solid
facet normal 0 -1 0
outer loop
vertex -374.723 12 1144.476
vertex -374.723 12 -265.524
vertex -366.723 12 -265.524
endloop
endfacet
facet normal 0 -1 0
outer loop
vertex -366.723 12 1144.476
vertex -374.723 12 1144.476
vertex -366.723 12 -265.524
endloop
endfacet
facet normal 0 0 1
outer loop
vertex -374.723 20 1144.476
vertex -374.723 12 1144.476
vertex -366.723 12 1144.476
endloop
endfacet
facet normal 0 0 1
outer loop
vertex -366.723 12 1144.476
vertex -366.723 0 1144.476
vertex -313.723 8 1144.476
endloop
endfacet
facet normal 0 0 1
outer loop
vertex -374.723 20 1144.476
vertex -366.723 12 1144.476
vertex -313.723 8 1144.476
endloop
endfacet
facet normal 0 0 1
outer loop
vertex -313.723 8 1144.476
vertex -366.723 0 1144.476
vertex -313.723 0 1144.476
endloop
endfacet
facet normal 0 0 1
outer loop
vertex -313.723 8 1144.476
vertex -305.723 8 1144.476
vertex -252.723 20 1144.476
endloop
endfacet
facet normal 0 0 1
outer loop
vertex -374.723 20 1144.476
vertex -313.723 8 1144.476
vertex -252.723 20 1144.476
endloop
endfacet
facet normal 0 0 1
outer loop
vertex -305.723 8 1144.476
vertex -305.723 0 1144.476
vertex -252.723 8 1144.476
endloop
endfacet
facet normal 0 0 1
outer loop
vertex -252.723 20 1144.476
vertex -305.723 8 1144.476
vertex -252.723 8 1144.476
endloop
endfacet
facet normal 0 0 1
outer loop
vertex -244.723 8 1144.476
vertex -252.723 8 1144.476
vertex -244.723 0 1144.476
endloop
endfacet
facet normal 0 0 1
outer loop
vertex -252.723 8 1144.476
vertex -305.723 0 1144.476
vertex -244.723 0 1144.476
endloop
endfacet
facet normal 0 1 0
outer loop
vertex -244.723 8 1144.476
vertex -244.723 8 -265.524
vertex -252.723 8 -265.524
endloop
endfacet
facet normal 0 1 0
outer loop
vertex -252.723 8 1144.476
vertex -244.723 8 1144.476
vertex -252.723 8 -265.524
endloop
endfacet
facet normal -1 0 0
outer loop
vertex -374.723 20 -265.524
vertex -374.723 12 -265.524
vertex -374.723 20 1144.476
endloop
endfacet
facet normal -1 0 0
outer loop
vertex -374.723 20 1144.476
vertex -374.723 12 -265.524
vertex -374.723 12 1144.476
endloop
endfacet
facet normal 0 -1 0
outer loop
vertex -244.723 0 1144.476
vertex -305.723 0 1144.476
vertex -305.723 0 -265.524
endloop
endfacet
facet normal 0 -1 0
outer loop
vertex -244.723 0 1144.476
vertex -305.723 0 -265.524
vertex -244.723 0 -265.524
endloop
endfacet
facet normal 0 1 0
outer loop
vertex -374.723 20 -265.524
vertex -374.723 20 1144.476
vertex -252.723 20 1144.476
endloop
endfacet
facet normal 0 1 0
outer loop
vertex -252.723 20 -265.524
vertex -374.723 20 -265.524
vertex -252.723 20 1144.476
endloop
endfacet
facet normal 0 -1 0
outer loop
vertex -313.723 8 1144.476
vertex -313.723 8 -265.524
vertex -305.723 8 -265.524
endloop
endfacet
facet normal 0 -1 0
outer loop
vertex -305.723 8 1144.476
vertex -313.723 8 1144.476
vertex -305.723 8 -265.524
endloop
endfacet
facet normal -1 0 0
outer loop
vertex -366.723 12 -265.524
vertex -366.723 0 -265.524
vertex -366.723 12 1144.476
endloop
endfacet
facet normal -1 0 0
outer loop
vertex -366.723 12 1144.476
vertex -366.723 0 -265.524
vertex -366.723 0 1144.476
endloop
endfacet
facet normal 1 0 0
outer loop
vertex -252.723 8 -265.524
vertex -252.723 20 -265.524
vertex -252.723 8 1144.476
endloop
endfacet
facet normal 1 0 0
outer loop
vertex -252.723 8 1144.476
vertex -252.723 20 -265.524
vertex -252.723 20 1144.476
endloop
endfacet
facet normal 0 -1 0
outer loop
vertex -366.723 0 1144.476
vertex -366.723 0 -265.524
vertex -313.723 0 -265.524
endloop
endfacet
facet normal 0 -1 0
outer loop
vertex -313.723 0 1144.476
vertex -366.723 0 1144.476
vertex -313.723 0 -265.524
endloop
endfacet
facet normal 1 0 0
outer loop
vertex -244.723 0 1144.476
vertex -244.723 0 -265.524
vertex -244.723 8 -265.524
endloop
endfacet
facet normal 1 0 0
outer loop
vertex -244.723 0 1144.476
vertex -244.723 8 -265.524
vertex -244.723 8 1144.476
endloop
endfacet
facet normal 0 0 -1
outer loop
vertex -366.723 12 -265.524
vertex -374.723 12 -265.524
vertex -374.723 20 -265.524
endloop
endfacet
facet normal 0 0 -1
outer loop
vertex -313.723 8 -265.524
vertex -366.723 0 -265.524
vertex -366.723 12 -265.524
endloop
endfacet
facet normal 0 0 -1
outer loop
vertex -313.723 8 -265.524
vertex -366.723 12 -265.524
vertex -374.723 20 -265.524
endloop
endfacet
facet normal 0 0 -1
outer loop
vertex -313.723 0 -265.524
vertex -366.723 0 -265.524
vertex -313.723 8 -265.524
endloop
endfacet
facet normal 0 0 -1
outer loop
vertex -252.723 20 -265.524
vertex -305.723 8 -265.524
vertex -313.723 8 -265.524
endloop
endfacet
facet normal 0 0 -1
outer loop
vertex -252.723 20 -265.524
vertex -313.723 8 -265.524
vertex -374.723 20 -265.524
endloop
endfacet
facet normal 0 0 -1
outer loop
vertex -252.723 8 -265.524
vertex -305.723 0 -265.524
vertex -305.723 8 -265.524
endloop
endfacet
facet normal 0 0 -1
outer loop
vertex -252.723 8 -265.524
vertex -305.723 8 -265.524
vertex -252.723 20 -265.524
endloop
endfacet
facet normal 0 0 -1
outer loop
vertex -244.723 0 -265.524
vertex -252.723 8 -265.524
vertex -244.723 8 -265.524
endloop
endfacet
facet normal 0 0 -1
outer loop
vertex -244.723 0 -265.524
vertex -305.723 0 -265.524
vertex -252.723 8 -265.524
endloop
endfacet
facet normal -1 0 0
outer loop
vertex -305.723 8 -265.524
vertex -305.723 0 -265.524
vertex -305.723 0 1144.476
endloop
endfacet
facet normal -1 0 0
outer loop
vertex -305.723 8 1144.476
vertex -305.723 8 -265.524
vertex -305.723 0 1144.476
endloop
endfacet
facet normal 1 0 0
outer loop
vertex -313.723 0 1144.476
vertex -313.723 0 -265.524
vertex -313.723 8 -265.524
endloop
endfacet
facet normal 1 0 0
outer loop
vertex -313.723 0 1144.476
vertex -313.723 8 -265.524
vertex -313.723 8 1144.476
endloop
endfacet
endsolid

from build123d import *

# Parameters (mm, degrees)
F0_W     = 130
F0_H     = 1410
F1_DEPTH = 20
F2_W     = 8
F2_H     = 1410
F3_DEPTH = 8
F4_W     = 8
F4_H     = 1460
F5_DEPTH = 12
F6_W     = 8
F6_H     = 1410
F7_DEPTH = 12


with BuildPart() as f1:
    # F0 (on Front) → F1 (new body)
    with BuildSketch(Plane.XZ):
        with Locations((-309.722924, 439.476302)):
            Rectangle(F0_W, F0_H)
    extrude(amount=-F1_DEPTH)

    # F2 (on face) → F3 (cut)
    with BuildSketch(Plane.XZ):
        with Locations((-309.722924, 439.476302)):
            Rectangle(F2_W, F2_H)
    extrude(amount=-F3_DEPTH, mode=Mode.SUBTRACT)

    # F4 (on face) → F5 (cut)
    with BuildSketch(Plane.XZ):
        with Locations((-370.722924, 414.476302)):
            Rectangle(F4_W, F4_H)
    extrude(amount=-F5_DEPTH, mode=Mode.SUBTRACT)

    # F6 (on face) → F7 (cut)
    with BuildSketch(Plane(origin=(0, 20, 0), x_dir=(-1, 0, 0), z_dir=(0, 1, 0))):
        with Locations((248.722924, 439.476302)):
            Rectangle(F6_W, F6_H)
    extrude(amount=-F7_DEPTH, mode=Mode.SUBTRACT)


solid = f1.part
